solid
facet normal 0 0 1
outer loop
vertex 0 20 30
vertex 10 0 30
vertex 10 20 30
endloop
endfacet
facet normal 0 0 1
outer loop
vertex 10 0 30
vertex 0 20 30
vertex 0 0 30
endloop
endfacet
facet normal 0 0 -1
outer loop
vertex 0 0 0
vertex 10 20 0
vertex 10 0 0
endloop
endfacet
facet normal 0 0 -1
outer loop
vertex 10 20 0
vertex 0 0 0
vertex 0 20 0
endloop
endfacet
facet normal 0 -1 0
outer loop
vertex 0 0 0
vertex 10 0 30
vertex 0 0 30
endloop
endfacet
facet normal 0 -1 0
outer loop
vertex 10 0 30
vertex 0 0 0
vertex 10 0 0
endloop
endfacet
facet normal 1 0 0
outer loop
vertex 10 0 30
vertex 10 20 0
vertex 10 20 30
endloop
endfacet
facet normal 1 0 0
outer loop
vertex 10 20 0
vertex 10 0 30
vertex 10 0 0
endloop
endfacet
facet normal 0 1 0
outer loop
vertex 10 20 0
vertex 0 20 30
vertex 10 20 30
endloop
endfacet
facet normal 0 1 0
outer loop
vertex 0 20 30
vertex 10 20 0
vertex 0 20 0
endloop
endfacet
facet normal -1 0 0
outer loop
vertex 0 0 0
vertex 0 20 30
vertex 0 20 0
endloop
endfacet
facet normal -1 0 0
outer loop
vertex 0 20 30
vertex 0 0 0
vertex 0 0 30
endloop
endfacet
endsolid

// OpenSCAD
// Smallest case: a corner-origin box. Verifies cube → box + half-size shift.
cube([10, 20, 30]);
